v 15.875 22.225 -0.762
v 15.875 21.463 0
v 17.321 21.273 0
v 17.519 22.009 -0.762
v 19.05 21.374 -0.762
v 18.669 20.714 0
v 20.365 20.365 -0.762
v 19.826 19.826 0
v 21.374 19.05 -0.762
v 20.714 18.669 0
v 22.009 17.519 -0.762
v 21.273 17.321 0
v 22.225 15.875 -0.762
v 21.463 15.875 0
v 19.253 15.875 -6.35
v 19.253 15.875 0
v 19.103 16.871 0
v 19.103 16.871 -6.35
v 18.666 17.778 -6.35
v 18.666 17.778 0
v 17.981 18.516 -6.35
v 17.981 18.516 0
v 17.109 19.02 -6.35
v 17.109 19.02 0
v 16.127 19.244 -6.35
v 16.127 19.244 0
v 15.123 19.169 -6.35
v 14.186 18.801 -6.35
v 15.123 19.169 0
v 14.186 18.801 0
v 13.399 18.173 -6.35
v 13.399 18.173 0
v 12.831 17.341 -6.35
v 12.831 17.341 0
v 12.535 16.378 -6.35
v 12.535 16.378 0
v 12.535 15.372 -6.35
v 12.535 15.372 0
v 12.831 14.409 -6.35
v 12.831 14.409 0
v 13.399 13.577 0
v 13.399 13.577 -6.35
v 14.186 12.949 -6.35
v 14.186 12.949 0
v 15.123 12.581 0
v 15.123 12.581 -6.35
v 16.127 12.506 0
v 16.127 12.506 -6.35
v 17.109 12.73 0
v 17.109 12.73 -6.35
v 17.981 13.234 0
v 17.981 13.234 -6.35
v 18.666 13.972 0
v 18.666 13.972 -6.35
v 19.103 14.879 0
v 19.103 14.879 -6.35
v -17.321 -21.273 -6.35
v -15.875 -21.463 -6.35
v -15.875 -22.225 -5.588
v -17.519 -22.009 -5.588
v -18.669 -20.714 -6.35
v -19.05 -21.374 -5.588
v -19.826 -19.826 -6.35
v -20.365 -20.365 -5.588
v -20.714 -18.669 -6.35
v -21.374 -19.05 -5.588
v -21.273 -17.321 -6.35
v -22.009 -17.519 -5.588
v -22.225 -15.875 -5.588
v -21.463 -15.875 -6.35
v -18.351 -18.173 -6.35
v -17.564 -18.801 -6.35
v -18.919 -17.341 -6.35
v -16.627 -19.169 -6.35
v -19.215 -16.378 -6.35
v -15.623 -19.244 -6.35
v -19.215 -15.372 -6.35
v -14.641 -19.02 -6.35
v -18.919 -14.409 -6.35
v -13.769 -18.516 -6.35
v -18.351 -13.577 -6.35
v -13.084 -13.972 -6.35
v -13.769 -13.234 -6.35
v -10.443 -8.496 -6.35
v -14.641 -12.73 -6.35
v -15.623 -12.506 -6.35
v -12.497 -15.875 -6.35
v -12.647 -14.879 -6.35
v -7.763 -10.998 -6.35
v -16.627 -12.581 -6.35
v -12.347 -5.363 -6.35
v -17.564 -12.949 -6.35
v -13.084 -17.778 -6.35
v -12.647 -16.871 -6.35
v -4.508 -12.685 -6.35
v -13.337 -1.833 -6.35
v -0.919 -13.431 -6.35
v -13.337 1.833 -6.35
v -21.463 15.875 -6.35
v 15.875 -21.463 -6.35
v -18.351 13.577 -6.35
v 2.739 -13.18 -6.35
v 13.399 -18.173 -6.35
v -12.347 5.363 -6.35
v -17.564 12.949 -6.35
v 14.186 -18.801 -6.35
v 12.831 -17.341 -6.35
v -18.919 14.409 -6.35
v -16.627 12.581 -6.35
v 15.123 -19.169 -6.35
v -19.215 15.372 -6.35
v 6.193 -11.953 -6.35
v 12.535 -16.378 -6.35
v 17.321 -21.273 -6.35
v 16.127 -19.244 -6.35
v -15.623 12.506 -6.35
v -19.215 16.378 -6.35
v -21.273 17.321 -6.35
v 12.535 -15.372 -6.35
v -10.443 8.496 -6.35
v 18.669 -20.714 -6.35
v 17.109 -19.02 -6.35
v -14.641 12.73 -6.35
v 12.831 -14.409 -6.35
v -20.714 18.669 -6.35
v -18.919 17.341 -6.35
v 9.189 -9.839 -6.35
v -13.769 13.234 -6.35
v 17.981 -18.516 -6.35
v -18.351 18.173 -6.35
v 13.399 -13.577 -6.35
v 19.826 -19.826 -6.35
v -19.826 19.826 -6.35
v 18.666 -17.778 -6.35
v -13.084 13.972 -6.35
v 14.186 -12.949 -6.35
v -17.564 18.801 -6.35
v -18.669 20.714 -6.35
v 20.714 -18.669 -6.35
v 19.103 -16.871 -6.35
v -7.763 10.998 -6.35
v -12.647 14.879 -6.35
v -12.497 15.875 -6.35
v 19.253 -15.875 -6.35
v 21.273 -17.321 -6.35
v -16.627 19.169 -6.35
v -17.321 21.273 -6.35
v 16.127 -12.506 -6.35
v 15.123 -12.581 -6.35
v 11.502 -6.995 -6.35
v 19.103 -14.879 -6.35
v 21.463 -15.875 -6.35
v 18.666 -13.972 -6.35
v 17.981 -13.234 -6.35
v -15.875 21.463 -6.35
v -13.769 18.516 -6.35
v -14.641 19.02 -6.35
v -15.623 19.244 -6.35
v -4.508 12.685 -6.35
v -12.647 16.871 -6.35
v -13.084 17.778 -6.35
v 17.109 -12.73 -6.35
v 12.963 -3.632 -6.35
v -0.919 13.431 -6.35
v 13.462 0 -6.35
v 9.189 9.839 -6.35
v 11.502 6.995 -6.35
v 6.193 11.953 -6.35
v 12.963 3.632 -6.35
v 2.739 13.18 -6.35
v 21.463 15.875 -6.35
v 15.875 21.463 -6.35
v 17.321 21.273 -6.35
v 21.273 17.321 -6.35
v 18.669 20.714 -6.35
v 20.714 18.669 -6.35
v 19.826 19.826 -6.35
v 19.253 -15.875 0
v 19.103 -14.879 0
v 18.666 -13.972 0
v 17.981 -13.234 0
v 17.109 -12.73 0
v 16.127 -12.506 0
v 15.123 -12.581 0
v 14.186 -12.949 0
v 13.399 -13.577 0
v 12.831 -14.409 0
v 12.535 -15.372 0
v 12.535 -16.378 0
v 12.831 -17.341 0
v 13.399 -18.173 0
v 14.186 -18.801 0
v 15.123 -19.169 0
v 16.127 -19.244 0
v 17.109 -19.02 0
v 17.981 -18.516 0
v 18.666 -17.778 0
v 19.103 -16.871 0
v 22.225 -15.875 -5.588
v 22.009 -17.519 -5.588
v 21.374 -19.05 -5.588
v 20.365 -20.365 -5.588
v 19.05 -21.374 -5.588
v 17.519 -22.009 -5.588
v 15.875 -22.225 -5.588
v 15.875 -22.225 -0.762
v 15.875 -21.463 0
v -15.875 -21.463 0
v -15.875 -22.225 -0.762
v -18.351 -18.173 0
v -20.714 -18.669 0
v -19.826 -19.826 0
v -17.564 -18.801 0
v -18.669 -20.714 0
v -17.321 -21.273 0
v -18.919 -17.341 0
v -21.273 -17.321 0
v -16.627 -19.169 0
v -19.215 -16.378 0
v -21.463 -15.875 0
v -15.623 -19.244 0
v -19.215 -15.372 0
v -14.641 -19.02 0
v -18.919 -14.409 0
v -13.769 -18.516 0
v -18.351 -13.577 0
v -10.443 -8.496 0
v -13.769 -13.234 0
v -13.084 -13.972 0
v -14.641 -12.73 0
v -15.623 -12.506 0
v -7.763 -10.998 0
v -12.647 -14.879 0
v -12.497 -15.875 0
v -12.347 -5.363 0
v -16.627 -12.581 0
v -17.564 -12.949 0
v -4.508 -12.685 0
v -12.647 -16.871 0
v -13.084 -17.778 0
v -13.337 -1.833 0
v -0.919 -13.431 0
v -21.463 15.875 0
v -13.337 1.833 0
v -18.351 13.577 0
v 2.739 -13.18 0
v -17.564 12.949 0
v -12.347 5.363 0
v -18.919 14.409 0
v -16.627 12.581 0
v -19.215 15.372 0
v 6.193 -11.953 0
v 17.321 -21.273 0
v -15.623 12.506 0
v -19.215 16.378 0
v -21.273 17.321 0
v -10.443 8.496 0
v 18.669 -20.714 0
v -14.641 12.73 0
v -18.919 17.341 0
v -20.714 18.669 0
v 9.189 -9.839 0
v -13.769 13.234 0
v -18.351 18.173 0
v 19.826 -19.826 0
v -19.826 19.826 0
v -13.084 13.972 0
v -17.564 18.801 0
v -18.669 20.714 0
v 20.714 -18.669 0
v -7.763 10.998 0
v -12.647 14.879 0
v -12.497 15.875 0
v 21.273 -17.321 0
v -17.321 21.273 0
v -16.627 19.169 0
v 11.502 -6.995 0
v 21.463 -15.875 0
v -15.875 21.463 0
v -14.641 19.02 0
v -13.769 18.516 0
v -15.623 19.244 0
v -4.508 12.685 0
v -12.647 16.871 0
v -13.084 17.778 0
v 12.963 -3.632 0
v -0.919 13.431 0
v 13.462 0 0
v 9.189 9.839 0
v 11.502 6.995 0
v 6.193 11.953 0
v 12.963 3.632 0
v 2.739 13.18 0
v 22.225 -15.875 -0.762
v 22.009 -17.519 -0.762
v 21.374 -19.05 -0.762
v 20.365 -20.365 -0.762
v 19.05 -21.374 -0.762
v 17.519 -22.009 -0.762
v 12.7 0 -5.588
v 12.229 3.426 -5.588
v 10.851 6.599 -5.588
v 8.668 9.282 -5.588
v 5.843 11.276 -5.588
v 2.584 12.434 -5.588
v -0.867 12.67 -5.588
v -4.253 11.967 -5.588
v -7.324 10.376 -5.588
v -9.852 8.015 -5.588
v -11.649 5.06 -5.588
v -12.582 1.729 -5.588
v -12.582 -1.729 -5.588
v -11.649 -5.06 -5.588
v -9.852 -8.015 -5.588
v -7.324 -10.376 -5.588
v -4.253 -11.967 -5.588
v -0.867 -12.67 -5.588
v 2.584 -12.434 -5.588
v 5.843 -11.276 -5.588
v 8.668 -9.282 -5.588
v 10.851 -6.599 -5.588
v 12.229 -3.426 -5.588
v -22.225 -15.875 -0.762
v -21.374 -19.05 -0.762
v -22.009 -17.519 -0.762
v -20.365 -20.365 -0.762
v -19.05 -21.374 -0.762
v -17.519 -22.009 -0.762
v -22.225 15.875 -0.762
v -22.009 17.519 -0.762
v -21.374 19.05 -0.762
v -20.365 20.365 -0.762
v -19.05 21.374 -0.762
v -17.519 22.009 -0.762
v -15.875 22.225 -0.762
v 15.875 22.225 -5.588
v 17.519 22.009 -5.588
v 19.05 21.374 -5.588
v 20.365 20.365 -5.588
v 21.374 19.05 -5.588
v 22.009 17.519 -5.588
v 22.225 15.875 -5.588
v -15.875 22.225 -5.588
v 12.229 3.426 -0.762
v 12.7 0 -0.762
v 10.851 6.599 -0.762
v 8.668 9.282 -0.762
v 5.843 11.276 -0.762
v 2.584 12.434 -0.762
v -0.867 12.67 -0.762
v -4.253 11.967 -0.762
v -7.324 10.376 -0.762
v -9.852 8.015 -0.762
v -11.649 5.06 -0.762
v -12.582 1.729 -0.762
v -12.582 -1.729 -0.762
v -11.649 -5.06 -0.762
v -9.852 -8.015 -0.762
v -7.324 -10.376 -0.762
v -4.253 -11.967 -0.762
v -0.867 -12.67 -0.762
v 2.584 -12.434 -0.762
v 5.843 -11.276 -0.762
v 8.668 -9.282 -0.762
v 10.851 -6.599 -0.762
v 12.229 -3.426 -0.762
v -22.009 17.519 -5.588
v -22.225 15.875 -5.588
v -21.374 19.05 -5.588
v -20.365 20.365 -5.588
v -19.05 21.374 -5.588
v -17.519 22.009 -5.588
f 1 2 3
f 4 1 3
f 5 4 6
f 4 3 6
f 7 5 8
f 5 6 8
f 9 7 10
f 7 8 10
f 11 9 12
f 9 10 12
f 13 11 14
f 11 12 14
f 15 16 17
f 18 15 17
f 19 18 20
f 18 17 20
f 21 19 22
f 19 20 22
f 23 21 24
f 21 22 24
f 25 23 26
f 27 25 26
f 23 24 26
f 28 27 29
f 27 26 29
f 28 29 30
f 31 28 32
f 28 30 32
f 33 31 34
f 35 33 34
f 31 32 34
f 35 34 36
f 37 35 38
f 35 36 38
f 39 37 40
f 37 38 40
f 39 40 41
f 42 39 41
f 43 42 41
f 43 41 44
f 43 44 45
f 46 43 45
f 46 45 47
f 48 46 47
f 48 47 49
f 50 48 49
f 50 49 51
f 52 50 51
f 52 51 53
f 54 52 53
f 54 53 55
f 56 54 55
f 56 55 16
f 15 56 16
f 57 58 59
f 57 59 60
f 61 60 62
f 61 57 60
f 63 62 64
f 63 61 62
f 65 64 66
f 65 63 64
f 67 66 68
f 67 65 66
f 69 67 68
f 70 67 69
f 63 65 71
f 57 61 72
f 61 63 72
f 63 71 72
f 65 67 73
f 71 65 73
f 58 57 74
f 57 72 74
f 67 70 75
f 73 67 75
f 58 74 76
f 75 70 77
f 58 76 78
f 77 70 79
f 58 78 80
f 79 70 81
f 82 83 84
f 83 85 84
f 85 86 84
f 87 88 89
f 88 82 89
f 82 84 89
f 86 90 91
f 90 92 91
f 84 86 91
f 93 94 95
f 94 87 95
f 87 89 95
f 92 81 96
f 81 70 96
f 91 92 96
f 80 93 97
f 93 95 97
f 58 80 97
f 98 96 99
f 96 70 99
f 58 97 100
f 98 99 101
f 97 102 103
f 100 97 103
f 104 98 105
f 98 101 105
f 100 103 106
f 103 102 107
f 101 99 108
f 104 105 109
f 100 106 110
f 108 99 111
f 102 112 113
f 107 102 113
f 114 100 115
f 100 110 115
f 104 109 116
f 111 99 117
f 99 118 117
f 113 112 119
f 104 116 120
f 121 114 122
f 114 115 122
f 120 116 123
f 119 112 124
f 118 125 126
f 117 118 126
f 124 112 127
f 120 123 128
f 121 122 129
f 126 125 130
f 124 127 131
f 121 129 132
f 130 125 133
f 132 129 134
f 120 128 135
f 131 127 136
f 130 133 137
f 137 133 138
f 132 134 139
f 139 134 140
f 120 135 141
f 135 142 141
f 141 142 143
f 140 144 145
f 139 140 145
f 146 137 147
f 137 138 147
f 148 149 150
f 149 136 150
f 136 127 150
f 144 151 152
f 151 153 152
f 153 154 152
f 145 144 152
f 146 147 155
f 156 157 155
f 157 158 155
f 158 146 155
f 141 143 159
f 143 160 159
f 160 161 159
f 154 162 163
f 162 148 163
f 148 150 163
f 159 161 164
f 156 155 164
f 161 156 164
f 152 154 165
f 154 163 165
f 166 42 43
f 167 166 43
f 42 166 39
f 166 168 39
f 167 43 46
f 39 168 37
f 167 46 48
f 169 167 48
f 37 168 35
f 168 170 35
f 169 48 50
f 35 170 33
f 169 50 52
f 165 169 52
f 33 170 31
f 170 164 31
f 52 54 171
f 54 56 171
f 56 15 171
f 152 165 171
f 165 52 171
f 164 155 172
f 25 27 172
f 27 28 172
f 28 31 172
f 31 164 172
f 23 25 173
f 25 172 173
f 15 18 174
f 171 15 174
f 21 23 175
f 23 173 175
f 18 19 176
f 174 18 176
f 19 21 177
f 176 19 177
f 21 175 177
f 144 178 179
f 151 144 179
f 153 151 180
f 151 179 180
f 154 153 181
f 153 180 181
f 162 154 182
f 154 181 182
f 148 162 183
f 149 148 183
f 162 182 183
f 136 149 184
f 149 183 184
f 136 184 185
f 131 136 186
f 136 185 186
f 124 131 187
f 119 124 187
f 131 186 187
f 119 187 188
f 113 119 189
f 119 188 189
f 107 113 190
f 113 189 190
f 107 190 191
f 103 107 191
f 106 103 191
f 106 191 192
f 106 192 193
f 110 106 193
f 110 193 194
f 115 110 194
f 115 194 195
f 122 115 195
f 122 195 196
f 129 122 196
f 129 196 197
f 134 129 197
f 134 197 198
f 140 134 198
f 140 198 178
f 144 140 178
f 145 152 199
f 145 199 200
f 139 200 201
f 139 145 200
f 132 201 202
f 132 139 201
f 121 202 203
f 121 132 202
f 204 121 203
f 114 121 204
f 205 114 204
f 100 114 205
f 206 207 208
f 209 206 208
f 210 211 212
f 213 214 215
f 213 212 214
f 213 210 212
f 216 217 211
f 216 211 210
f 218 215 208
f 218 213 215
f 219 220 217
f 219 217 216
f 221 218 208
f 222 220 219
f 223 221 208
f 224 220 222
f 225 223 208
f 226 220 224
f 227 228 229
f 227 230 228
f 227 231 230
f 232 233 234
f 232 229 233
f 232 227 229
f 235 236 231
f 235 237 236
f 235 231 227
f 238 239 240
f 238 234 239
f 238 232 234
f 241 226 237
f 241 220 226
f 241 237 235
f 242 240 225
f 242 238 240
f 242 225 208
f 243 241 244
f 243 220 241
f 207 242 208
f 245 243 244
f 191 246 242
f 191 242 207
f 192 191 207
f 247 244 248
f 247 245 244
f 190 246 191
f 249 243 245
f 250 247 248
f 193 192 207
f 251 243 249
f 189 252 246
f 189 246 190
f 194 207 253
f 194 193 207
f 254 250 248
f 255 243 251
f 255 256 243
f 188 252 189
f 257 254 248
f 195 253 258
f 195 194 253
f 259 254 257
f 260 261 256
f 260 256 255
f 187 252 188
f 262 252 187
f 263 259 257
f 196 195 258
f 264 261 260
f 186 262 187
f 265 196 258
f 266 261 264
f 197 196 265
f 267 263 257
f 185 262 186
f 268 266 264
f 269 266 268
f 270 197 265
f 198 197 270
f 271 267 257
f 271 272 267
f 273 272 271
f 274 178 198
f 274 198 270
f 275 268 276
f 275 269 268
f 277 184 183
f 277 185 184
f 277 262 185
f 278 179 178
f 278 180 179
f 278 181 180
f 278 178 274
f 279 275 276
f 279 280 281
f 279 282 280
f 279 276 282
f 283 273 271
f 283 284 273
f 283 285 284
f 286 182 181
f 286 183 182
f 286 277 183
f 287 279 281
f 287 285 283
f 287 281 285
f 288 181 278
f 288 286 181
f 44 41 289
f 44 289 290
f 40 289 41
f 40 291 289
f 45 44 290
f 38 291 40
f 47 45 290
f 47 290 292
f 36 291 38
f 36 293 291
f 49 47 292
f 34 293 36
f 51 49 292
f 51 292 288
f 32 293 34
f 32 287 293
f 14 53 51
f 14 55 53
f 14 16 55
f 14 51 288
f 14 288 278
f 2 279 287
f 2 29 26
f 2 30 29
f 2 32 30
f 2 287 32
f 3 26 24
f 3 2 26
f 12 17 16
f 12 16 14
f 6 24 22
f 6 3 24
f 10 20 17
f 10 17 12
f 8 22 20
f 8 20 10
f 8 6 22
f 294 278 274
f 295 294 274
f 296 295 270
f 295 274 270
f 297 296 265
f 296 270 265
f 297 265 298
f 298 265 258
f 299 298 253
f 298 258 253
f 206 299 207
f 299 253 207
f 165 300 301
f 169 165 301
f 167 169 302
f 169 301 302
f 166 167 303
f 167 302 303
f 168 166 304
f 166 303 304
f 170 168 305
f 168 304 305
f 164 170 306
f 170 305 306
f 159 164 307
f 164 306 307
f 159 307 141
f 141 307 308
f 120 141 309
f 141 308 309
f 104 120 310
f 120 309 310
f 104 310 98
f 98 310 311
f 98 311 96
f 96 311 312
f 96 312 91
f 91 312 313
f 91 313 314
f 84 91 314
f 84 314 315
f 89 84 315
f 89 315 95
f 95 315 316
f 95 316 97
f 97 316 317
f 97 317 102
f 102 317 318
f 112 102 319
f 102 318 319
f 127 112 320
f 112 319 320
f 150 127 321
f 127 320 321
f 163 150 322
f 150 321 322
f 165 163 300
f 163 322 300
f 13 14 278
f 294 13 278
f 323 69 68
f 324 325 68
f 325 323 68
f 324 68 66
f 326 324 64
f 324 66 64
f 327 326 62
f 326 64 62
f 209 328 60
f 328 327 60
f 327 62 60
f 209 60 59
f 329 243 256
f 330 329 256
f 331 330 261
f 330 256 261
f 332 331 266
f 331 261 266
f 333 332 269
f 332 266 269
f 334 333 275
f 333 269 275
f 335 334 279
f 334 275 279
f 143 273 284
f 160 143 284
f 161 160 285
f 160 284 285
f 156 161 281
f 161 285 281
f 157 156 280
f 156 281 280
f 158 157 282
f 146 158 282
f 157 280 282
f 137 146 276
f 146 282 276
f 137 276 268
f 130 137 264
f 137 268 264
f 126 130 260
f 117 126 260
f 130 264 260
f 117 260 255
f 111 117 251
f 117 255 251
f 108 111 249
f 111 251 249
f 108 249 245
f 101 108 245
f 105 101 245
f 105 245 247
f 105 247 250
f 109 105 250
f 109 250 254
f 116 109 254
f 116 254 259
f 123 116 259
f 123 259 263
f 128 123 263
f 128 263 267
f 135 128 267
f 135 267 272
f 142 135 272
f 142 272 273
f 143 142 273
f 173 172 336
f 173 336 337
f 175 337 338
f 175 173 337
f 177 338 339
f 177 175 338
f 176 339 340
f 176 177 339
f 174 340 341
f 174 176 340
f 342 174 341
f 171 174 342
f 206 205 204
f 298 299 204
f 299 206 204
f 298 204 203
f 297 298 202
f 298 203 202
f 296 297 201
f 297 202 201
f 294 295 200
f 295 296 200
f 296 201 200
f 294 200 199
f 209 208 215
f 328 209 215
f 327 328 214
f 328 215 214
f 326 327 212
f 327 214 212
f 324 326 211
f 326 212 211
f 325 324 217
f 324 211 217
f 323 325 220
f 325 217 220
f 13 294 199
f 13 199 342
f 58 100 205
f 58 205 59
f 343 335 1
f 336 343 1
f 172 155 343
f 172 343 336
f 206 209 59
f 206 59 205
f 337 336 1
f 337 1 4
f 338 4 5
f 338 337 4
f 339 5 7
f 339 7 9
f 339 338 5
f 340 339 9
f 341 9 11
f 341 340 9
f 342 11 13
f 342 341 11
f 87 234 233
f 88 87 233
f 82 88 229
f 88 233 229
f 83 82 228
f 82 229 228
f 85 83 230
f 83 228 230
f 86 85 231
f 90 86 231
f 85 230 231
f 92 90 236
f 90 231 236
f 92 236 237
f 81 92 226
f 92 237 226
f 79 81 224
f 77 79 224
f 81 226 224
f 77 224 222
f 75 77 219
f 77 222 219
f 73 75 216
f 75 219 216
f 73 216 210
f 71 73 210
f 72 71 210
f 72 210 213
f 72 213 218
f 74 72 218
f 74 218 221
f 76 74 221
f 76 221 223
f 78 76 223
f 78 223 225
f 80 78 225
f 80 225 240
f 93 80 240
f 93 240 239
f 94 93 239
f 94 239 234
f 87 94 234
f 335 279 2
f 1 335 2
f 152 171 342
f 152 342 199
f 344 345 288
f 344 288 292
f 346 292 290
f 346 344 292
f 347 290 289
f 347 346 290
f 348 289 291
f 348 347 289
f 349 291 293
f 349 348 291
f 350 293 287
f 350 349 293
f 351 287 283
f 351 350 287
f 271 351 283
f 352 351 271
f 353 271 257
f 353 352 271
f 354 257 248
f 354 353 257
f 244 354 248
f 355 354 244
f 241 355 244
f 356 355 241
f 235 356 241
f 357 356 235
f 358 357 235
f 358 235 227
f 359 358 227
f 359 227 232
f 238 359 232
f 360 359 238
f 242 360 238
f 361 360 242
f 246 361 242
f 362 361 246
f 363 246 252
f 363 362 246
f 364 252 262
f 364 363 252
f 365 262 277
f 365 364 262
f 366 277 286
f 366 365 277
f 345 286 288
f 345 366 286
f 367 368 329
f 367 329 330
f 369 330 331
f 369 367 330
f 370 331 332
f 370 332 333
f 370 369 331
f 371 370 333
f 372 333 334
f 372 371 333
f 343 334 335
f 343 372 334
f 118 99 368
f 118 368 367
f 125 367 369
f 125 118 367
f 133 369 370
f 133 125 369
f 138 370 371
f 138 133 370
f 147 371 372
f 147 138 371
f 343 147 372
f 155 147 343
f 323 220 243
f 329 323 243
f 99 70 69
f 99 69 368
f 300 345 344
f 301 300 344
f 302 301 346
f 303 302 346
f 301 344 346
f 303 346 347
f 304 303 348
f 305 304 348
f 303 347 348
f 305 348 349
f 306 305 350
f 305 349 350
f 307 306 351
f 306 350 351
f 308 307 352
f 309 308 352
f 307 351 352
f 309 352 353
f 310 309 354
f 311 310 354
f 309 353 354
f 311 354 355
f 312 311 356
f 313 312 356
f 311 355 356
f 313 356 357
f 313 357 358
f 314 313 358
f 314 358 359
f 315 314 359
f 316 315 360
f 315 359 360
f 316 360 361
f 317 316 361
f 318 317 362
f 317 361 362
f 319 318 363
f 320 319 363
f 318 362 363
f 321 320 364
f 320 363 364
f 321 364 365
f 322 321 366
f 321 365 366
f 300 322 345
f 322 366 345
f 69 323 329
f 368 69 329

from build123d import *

# Parameters (mm, degrees)
BASE_SKETCH_W           = 44.45
BASE_SKETCH_H           = 44.45
BASE_SKETCH_R           = 12.7
BASE_EXTRUDE_DEPTH      = 6.35
CORNER_FILLET_R         = 6.35
PERIPHERAL_CHAMFER_SIZE = 0.762
CORNER_SKETCH_R         = 3.3782
CORNER_CUT_DEPTH        = 33.065928179


with BuildPart() as part:
    # Base Sketch → Base Extrude (new body)
    with BuildSketch(Plane.XY):
        Rectangle(BASE_SKETCH_W, BASE_SKETCH_H)
        Circle(BASE_SKETCH_R, mode=Mode.SUBTRACT)
    extrude(amount=-BASE_EXTRUDE_DEPTH)

    # Corner Fillet
    corner_fillet_edges = [part.edges().sort_by_distance(p)[0] for p in [
        (-22.225, 22.225, -3.175),
        (22.225, 22.225, -3.175),
        (22.225, -22.225, -3.175),
        (-22.225, -22.225, -3.175),
    ]]
    fillet(corner_fillet_edges, radius=CORNER_FILLET_R)

    # Peripheral Chamfer
    peripheral_chamfer_edges = [part.edges().sort_by_distance(p)[0] for p in [
        (-12.7, 0, -6.35),
        (-12.7, 0, 0),
        (-22.225, 0, 0),
        (-22.225, 0, -6.35),
        (0, -22.225, 0),
        (22.225, 0, 0),
        (0, 22.225, 0),
        (20.365128061, 20.365128061, 0),
        (20.365128061, -20.365128061, 0),
        (-20.365128061, 20.365128061, 0),
        (-20.365128061, -20.365128061, 0),
        (0, -22.225, -6.35),
        (0, 22.225, -6.35),
        (22.225, 0, -6.35),
        (20.365128061, 20.365128061, -6.35),
        (20.365128061, -20.365128061, -6.35),
        (-20.365128061, 20.365128061, -6.35),
        (-20.365128061, -20.365128061, -6.35),
    ]]
    chamfer(peripheral_chamfer_edges, length=PERIPHERAL_CHAMFER_SIZE)

    # Corner Sketch → Corner Cut (cut, through all)
    with BuildSketch(Plane.XY):
        with Locations((15.875, 15.875)):
            Circle(CORNER_SKETCH_R)
        with Locations((15.875, -15.875)):
            Circle(CORNER_SKETCH_R)
        with Locations((-15.875, -15.875)):
            Circle(CORNER_SKETCH_R)
        with Locations((-15.875, 15.875)):
            Circle(CORNER_SKETCH_R)
    extrude(amount=-CORNER_CUT_DEPTH, mode=Mode.SUBTRACT)


solid = part.part
